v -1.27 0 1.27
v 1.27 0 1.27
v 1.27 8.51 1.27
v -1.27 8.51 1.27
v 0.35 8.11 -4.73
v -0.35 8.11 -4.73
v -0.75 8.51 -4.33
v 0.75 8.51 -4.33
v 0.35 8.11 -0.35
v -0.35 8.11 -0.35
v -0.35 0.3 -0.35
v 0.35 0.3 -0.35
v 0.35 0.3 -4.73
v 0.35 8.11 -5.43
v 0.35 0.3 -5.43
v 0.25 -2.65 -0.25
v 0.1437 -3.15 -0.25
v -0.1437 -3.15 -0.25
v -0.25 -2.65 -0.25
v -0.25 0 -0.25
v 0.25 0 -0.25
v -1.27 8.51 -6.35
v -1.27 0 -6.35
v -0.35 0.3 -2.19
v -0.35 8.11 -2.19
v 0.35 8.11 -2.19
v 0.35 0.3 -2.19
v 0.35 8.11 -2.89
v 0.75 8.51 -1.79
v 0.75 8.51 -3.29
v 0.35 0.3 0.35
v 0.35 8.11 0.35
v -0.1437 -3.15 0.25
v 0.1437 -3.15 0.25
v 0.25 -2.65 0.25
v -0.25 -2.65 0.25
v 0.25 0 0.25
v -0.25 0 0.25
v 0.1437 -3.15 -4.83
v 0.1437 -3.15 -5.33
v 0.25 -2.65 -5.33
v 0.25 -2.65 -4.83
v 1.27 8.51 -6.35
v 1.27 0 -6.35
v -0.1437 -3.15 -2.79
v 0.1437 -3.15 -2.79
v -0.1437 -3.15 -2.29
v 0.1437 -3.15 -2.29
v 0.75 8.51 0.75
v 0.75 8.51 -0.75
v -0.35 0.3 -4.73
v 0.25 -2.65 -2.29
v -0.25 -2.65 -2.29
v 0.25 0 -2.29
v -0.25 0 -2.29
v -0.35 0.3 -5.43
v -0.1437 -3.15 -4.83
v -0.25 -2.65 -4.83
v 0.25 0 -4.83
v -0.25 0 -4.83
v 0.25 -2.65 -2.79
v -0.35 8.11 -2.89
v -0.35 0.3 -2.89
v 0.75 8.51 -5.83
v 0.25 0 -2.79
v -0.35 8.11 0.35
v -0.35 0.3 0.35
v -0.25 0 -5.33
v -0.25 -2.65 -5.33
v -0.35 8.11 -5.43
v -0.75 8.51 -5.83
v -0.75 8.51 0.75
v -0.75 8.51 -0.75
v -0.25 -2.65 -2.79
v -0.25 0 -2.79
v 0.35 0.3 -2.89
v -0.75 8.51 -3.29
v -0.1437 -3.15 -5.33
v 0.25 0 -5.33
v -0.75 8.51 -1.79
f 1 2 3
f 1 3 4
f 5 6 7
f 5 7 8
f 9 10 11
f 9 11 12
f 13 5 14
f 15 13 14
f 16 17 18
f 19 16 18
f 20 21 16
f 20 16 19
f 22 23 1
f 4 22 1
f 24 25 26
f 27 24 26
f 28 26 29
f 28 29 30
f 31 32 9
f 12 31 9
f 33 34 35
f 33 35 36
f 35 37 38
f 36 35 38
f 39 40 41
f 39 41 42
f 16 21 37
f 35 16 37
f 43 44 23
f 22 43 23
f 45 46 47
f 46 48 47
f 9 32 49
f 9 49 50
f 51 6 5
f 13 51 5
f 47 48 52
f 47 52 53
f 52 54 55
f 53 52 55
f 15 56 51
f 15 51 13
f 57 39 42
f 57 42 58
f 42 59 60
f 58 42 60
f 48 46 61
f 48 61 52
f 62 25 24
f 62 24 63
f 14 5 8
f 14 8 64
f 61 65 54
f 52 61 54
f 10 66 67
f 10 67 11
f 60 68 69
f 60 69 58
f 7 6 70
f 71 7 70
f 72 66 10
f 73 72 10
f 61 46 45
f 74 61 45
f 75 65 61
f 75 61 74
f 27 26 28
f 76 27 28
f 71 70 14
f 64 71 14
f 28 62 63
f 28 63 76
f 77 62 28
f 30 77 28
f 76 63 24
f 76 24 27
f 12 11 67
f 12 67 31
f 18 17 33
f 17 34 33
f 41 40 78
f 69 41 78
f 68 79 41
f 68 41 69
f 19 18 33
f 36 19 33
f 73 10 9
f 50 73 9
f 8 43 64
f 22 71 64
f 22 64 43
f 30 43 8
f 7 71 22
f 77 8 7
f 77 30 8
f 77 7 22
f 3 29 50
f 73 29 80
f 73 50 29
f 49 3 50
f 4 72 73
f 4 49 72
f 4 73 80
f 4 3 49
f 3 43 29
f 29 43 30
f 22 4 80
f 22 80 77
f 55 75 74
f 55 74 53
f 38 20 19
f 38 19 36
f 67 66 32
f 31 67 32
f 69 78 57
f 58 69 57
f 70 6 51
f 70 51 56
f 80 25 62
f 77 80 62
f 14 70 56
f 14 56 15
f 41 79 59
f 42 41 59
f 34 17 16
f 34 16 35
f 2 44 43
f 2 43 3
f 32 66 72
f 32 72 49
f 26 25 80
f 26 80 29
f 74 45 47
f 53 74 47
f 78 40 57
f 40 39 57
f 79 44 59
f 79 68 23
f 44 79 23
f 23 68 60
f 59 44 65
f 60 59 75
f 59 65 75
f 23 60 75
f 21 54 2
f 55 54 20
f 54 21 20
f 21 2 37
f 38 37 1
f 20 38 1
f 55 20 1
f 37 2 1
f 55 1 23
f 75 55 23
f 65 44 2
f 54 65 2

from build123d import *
from OCP.BRepFilletAPI import BRepFilletAPI_MakeChamfer

# Parameters (mm, degrees)
SKETCH_1_W                          = 2.54
SKETCH_1_H                          = 2.54
EXTRUDE_1_DEPTH                     = 8.51
SKETCH_4_W                          = 0.7
SKETCH_4_H                          = 0.7
CUT_EXTRUDE_1_DEPTH                 = 8.21
CHAMFER_3_SIZE                      = 0.4
SKETCH_2_W                          = 0.5
SKETCH_2_H                          = 0.5
EXTRUDE_2_DEPTH                     = 3.15
CHAMFER_2_SIZE                      = 0.5
CHAMFER_2_SIZE2                     = 0.106278281
PATTERN_LINEAR_1_COUNT              = 3
PATTERN_LINEAR_1_PITCH              = 2.54
CHAMFER_3_OF_PATTERN_LINEAR_1_SIZE  = 0.4
CHAMFER_2_OF_PATTERN_LINEAR_1_SIZE  = 0.5
CHAMFER_2_OF_PATTERN_LINEAR_1_SIZE2 = 0.106278281


with BuildPart() as part:
    # Эскиз1 → Бобышка-Вытянуть1 (new body)
    with BuildSketch(Plane(origin=(0, 0, 0), x_dir=(-1, 0, 0), z_dir=(0, 1, 0))):
        Rectangle(SKETCH_1_W, SKETCH_1_H)
    extrude_1 = extrude(amount=EXTRUDE_1_DEPTH)

    # Эскиз4 → Вырез-Вытянуть1 (cut)
    with BuildSketch(Plane(origin=(0, 8.51, 0), x_dir=(1, 0, 0), z_dir=(0, 1, 0))):
        Rectangle(SKETCH_4_W, SKETCH_4_H)
    cut_extrude_1 = extrude(amount=-CUT_EXTRUDE_1_DEPTH, mode=Mode.SUBTRACT)

    # Фаска3
    chamfer_3_edges = [part.edges().sort_by_distance(p)[0] for p in [
        (-0.35, 8.51, 0),
        (0, 8.51, 0.35),
        (0.35, 8.51, 0),
        (0, 8.51, -0.35),
    ]]
    chamfer(chamfer_3_edges, length=CHAMFER_3_SIZE)

    # Эскиз2 → Бобышка-Вытянуть2 (add)
    with BuildSketch(Plane(origin=(0, 0, 0), x_dir=(-1, 0, 0), z_dir=(0, 1, 0))):
        Rectangle(SKETCH_2_W, SKETCH_2_H)
    extrude_2 = extrude(amount=-EXTRUDE_2_DEPTH)

    # Фаска2: one chamfer whose edges measure the first distance from different faces: ONE call of the kernel's chamfer builder (chamfer() names one face for all edges)
    chamfer_2_edges_1 = [part.edges().sort_by_distance(p)[0] for p in [
        (-0.25, -3.15, 0),
    ]]
    chamfer_2_side_1 = [part.faces().sort_by_distance(p)[0] for p in [
        (-0.25, -1.575, 0),
    ]]
    chamfer_2_edges_2 = [part.edges().sort_by_distance(p)[0] for p in [
        (0.25, -3.15, 0),
    ]]
    chamfer_2_side_2 = [part.faces().sort_by_distance(p)[0] for p in [
        (0.25, -1.575, 0),
    ]]
    chamfer_2 = BRepFilletAPI_MakeChamfer(part.part.solid().wrapped)
    for e in chamfer_2_edges_1:
        chamfer_2.Add(CHAMFER_2_SIZE, CHAMFER_2_SIZE2, e.wrapped, chamfer_2_side_1[0].wrapped)  # the first distance lies on this face
    for e in chamfer_2_edges_2:
        chamfer_2.Add(CHAMFER_2_SIZE, CHAMFER_2_SIZE2, e.wrapped, chamfer_2_side_2[0].wrapped)  # the first distance lies on this face
    add(Compound.cast(chamfer_2.Shape()), mode=Mode.REPLACE)

    # Линейный массив1: Бобышка-Вытянуть1, Вырез-Вытянуть1, Бобышка-Вытянуть2 ×3
    with Locations(*[(0, 0, -i * PATTERN_LINEAR_1_PITCH) for i in range(1, PATTERN_LINEAR_1_COUNT)]):
        add(extrude_1)
        add(cut_extrude_1, mode=Mode.SUBTRACT)
        add(extrude_2)

    # Фаска3 of Линейный массив1
    chamfer_3_of_pattern_linear_1_edges = [part.edges().sort_by_distance(p)[0] for p in [
        (-0.35, 8.51, -2.54),
        (0, 8.51, -2.19),
        (0.35, 8.51, -2.54),
        (0, 8.51, -2.89),
        (-0.35, 8.51, -5.08),
        (0, 8.51, -4.73),
        (0.35, 8.51, -5.08),
        (0, 8.51, -5.43),
    ]]
    chamfer(chamfer_3_of_pattern_linear_1_edges, length=CHAMFER_3_OF_PATTERN_LINEAR_1_SIZE)

    # Фаска2 of Линейный массив1: one chamfer whose edges measure the first distance from different faces: ONE call of the kernel's chamfer builder (chamfer() names one face for all edges)
    chamfer_2_of_pattern_linear_1_edges_1 = [part.edges().sort_by_distance(p)[0] for p in [
        (-0.25, -3.15, -2.54),
    ]]
    chamfer_2_of_pattern_linear_1_side_1 = [part.faces().sort_by_distance(p)[0] for p in [
        (-0.25, -1.575, -2.54),
    ]]
    chamfer_2_of_pattern_linear_1_edges_2 = [part.edges().sort_by_distance(p)[0] for p in [
        (0.25, -3.15, -2.54),
    ]]
    chamfer_2_of_pattern_linear_1_side_2 = [part.faces().sort_by_distance(p)[0] for p in [
        (0.25, -1.575, -2.54),
    ]]
    chamfer_2_of_pattern_linear_1_edges_3 = [part.edges().sort_by_distance(p)[0] for p in [
        (-0.25, -3.15, -5.08),
    ]]
    chamfer_2_of_pattern_linear_1_side_3 = [part.faces().sort_by_distance(p)[0] for p in [
        (-0.25, -1.575, -5.08),
    ]]
    chamfer_2_of_pattern_linear_1_edges_4 = [part.edges().sort_by_distance(p)[0] for p in [
        (0.25, -3.15, -5.08),
    ]]
    chamfer_2_of_pattern_linear_1_side_4 = [part.faces().sort_by_distance(p)[0] for p in [
        (0.25, -1.575, -5.08),
    ]]
    chamfer_2_of_pattern_linear_1 = BRepFilletAPI_MakeChamfer(part.part.solid().wrapped)
    for e in chamfer_2_of_pattern_linear_1_edges_1:
        chamfer_2_of_pattern_linear_1.Add(CHAMFER_2_OF_PATTERN_LINEAR_1_SIZE, CHAMFER_2_OF_PATTERN_LINEAR_1_SIZE2, e.wrapped, chamfer_2_of_pattern_linear_1_side_1[0].wrapped)  # the first distance lies on this face
    for e in chamfer_2_of_pattern_linear_1_edges_2:
        chamfer_2_of_pattern_linear_1.Add(CHAMFER_2_OF_PATTERN_LINEAR_1_SIZE, CHAMFER_2_OF_PATTERN_LINEAR_1_SIZE2, e.wrapped, chamfer_2_of_pattern_linear_1_side_2[0].wrapped)  # the first distance lies on this face
    for e in chamfer_2_of_pattern_linear_1_edges_3:
        chamfer_2_of_pattern_linear_1.Add(CHAMFER_2_OF_PATTERN_LINEAR_1_SIZE, CHAMFER_2_OF_PATTERN_LINEAR_1_SIZE2, e.wrapped, chamfer_2_of_pattern_linear_1_side_3[0].wrapped)  # the first distance lies on this face
    for e in chamfer_2_of_pattern_linear_1_edges_4:
        chamfer_2_of_pattern_linear_1.Add(CHAMFER_2_OF_PATTERN_LINEAR_1_SIZE, CHAMFER_2_OF_PATTERN_LINEAR_1_SIZE2, e.wrapped, chamfer_2_of_pattern_linear_1_side_4[0].wrapped)  # the first distance lies on this face
    add(Compound.cast(chamfer_2_of_pattern_linear_1.Shape()), mode=Mode.REPLACE)


solid = part.part
